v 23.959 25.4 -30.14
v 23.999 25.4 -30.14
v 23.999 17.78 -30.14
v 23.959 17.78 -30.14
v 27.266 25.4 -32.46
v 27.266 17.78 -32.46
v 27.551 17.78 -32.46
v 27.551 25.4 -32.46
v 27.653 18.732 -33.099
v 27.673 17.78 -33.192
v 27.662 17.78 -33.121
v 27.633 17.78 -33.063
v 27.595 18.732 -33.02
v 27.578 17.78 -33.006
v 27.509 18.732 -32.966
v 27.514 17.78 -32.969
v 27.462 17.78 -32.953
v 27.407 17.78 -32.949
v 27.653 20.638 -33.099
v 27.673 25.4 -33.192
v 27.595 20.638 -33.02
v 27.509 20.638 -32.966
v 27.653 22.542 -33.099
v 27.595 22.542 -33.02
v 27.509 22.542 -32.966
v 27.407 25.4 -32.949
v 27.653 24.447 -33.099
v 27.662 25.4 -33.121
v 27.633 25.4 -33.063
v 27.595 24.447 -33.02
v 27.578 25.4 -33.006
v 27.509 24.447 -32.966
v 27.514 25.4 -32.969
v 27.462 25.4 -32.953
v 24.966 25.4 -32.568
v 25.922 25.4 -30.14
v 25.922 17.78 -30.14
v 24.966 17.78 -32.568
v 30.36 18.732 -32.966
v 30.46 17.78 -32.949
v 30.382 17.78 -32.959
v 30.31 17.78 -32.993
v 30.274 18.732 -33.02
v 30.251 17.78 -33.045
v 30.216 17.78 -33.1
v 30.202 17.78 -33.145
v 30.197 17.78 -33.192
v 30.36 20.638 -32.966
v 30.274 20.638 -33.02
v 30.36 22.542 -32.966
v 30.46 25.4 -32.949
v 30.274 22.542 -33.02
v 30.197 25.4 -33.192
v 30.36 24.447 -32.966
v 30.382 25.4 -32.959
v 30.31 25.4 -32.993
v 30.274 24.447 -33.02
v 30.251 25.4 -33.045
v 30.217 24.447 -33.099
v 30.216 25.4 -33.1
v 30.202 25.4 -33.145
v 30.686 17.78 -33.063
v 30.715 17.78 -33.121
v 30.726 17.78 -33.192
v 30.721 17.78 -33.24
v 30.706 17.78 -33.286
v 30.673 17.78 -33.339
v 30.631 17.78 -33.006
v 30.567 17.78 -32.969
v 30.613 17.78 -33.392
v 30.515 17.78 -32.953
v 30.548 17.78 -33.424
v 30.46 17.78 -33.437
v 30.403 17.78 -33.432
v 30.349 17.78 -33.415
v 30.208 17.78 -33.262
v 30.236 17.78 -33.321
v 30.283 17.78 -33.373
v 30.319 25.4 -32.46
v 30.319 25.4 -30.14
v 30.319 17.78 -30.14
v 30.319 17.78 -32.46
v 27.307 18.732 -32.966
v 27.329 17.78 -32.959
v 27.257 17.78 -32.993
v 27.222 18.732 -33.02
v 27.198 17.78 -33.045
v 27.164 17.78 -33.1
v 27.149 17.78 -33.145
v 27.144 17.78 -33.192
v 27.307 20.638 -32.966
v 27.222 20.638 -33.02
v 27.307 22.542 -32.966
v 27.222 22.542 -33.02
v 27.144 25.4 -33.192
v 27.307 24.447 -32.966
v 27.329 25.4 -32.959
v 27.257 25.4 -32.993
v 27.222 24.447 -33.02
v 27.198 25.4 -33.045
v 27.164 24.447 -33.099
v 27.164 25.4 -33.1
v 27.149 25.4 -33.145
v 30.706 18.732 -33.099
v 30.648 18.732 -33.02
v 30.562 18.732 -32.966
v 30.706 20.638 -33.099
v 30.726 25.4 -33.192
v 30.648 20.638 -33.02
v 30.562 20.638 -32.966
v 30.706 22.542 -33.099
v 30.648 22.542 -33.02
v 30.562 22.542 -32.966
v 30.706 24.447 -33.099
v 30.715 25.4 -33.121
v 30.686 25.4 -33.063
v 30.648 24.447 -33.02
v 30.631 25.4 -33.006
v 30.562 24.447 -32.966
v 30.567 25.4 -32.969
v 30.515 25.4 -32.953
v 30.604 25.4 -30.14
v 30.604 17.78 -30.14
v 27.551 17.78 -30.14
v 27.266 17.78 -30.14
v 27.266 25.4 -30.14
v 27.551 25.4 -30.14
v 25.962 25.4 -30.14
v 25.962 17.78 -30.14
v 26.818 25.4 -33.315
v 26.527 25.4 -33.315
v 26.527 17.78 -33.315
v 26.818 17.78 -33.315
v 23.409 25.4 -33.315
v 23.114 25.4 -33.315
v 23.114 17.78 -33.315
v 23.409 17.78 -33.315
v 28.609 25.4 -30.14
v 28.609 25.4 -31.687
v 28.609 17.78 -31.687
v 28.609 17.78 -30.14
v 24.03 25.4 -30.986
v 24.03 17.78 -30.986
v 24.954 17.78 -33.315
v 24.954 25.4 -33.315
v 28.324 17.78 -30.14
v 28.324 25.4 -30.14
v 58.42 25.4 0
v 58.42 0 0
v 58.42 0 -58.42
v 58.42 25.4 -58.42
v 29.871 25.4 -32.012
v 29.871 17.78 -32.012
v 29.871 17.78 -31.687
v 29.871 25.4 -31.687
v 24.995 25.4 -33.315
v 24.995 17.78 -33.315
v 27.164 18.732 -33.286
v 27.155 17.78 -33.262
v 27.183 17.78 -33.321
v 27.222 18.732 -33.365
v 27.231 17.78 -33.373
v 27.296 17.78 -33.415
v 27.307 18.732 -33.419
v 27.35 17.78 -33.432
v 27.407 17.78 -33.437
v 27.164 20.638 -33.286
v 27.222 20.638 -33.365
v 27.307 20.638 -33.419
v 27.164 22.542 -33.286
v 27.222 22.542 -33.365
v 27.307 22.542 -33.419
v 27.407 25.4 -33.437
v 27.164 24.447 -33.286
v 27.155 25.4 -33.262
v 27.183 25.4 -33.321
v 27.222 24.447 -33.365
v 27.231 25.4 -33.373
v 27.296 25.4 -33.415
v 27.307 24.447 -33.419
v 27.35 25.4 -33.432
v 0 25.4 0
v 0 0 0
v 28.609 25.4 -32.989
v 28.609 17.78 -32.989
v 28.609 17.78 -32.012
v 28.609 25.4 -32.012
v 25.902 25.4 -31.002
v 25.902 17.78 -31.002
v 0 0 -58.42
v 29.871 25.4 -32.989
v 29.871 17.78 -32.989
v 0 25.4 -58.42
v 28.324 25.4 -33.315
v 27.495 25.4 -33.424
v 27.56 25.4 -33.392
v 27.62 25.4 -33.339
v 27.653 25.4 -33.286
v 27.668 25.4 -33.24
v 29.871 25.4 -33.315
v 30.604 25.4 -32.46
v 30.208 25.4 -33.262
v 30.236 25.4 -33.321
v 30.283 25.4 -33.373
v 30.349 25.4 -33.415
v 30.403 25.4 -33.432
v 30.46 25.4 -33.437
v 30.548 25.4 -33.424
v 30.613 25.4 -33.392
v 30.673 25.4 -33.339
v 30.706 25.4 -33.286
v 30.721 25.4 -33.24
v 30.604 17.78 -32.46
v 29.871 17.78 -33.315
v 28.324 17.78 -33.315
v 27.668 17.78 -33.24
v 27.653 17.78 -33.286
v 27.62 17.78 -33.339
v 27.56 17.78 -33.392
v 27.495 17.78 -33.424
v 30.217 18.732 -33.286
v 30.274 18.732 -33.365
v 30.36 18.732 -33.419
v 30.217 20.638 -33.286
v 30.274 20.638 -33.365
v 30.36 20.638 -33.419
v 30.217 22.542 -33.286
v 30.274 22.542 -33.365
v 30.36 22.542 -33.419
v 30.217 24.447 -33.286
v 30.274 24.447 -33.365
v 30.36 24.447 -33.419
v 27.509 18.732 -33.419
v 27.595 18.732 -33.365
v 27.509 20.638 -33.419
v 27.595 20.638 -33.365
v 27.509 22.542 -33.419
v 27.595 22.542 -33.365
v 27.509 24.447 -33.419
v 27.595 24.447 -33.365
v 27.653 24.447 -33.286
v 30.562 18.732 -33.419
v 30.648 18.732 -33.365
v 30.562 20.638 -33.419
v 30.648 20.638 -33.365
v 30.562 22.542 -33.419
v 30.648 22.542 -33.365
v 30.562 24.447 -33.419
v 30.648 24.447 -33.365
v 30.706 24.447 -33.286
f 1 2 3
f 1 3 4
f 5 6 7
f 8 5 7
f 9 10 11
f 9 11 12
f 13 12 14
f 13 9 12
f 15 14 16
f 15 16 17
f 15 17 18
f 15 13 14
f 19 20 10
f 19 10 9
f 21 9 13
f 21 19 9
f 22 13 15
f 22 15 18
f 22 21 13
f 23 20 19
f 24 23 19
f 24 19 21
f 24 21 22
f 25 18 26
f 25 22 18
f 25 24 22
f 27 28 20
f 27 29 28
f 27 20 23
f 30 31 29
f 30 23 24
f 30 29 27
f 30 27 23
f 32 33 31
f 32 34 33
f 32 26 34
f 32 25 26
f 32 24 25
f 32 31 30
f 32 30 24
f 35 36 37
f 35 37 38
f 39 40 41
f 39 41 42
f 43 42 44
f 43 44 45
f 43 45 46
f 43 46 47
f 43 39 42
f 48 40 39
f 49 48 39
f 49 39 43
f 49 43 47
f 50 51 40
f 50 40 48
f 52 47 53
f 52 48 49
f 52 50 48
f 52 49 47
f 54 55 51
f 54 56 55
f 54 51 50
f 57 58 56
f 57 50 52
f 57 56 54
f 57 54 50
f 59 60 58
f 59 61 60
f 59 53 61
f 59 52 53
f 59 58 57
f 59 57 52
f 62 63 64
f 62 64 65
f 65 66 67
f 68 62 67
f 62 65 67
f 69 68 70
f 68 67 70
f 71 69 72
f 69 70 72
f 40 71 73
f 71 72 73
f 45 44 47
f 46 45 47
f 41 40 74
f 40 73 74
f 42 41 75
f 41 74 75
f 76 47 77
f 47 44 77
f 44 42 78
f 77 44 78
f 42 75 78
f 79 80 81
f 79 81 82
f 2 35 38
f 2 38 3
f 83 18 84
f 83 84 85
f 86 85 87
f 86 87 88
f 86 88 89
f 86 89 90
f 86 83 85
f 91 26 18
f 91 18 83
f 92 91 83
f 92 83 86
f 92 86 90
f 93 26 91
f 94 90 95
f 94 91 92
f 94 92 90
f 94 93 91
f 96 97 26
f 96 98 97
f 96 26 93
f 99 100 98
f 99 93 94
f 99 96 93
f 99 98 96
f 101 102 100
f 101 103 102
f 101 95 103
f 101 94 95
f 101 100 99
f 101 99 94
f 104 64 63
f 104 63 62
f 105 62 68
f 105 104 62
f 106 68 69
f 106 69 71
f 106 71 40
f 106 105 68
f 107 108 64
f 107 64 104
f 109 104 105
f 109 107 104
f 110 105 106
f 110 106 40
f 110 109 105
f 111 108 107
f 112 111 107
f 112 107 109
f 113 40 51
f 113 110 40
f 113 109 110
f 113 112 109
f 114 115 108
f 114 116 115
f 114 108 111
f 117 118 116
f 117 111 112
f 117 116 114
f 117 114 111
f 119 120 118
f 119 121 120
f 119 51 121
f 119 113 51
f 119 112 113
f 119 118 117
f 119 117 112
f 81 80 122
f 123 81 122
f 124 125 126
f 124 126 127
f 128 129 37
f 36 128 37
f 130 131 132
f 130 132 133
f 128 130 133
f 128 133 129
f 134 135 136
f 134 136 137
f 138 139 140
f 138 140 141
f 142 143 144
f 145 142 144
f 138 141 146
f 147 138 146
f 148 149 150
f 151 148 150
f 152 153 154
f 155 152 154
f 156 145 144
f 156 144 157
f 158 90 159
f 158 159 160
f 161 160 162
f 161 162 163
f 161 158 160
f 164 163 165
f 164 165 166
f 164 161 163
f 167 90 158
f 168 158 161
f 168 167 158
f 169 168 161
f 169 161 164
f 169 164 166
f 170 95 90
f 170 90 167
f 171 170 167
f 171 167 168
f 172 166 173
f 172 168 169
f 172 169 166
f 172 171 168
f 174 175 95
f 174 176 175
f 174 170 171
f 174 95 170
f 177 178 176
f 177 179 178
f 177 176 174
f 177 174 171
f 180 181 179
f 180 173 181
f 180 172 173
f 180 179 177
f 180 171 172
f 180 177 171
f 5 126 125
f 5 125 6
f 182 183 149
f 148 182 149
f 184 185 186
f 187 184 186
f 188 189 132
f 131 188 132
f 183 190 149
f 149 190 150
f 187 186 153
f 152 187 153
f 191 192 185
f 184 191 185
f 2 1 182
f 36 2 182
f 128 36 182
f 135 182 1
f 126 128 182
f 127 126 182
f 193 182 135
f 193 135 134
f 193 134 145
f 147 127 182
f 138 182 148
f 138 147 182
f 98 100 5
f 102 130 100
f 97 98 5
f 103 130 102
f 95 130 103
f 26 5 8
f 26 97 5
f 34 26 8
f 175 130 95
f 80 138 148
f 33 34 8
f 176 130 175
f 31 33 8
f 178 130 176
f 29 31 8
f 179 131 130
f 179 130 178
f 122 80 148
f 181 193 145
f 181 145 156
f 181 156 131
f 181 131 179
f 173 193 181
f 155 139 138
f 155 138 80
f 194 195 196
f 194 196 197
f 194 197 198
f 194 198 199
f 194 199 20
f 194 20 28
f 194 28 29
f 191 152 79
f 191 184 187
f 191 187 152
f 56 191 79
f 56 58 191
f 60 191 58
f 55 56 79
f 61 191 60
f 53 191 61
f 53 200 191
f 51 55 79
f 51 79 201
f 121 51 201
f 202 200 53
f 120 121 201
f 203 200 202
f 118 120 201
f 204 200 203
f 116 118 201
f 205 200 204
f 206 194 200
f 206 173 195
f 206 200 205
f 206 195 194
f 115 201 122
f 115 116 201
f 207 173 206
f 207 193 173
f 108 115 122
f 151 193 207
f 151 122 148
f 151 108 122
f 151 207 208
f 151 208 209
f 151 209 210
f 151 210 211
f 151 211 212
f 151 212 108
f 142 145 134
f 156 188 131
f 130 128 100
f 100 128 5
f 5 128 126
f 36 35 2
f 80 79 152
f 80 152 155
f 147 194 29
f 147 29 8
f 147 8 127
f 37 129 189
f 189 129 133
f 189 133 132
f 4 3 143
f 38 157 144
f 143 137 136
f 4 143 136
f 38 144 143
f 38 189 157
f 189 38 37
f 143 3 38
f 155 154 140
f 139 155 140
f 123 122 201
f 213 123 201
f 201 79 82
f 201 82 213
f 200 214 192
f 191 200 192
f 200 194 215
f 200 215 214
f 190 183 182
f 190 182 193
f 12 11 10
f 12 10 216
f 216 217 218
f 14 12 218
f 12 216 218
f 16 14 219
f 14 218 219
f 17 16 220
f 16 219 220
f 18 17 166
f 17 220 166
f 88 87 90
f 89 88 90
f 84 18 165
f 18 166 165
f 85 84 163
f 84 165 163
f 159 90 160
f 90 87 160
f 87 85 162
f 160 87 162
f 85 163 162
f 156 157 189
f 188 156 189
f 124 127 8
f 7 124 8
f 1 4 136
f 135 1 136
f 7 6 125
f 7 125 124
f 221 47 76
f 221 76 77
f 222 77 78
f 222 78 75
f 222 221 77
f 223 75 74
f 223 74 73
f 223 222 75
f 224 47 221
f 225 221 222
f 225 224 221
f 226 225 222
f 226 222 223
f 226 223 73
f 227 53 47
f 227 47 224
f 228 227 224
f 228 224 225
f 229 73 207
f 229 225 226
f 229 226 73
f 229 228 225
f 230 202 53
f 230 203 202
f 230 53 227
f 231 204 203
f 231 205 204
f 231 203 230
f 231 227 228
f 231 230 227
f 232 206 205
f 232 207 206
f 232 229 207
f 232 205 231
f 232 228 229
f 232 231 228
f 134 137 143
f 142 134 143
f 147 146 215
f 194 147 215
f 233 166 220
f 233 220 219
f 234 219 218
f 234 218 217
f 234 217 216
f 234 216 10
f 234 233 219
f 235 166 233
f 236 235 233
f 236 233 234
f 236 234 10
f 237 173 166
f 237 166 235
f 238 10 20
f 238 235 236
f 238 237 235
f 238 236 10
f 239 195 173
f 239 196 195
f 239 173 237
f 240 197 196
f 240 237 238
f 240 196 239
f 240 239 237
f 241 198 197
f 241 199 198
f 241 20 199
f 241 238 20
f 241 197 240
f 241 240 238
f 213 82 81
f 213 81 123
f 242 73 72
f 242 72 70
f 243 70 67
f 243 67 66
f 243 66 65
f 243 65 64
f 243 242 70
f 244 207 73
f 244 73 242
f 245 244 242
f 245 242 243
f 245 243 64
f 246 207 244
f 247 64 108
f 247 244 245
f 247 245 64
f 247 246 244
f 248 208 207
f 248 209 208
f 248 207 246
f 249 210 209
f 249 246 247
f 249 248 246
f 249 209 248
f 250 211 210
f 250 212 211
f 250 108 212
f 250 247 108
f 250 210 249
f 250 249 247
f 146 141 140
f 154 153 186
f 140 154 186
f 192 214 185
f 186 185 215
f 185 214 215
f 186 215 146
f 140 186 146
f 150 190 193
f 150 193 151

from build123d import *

# Parameters (mm, degrees)
SKETCH1_W           = 58.42
SKETCH1_H           = 58.42
BOSS_EXTRUDE1_DEPTH = 25.4
SKETCH2_W           = 0.284935898
SKETCH2_H           = 2.320192308
SKETCH2_W_2         = 0.284935897
CUT_EXTRUDE1_DEPTH  = 7.62


with BuildPart() as part:
    # Sketch1 → Boss-Extrude1 (new body)
    with BuildSketch(Plane(origin=(0, 0, 0), x_dir=(1, 0, 0), z_dir=(0, 1, 0))):
        with Locations((29.21, 29.21)):
            Rectangle(SKETCH1_W, SKETCH1_H)
    extrude(amount=BOSS_EXTRUDE1_DEPTH)

    # Sketch2 → Cut-Extrude1 (cut)
    with BuildSketch(Plane(origin=(0, 25.4, 0), x_dir=(1, 0, 0), z_dir=(0, 1, 0))):
        Polygon((23.114155591, 33.314953012), (23.408631753, 33.314953012), (24.030020976, 30.986492475), (24.95415459, 33.314953012), (24.995495735, 33.314953012), (25.902456873, 31.002392916), (26.527026184, 33.314953012), (26.818322258, 33.314953012), (25.96224253, 30.139953012), (25.921537402, 30.139953012), (24.966238925, 32.568268317), (23.99949213, 30.139953012), (23.958787001, 30.139953012), align=None)
        with BuildLine():
            add(Edge.make_bspline(
                [(27.407274582, 33.437068397), (27.42495599, 33.436248201), (27.459579582, 33.434642101), (27.509647761, 33.420888476), (27.55523805, 33.39757519), (27.595676422, 33.366297193), (27.630376348, 33.329513055), (27.654670278, 33.286640605), (27.67028438, 33.240323126), (27.672169927, 33.208015152), (27.67312995, 33.191565592)],
                knots=[0, 0, 0, 0, 1.055194115, 2.066272739, 3.074728998, 4.095836921, 5.109056067, 6.073838105, 7.019297344, 8, 8, 8, 8], degree=3))
            add(Edge.make_bspline(
                [(27.67312995, 33.191565592), (27.672148277, 33.175543043), (27.670207624, 33.143868358), (27.654682338, 33.098353851), (27.630169308, 33.056077108), (27.595698673, 33.019364393), (27.555232154, 32.988103687), (27.509649327, 32.964785817), (27.45957917, 32.951033407), (27.42495585, 32.949427139), (27.407274582, 32.948606858)],
                knots=[0, 0, 0, 0, 0.96129708, 1.900370562, 2.859976407, 3.87933698, 4.906634145, 5.921202961, 6.938410037, 8, 8, 8, 8], degree=3))
            add(Edge.make_bspline(
                [(27.407274582, 32.948606858), (27.389795503, 32.949395819), (27.355774761, 32.950931427), (27.306456269, 32.965055658), (27.26125471, 32.988111667), (27.220737472, 33.019159706), (27.186964368, 33.056302577), (27.162382316, 33.098328051), (27.146892886, 33.143874927), (27.144947401, 33.175545249), (27.143963284, 33.191565592)],
                knots=[0, 0, 0, 0, 1.054934014, 2.053291228, 3.073705704, 4.106921865, 5.123545215, 6.088680038, 7.033164197, 8, 8, 8, 8], degree=3))
            add(Edge.make_bspline(
                [(27.143963284, 33.191565592), (27.144925841, 33.208012863), (27.146816364, 33.24031634), (27.162393926, 33.286666835), (27.186759609, 33.329285768), (27.220759834, 33.366501757), (27.261248759, 33.397567259), (27.306457806, 33.420618649), (27.355774355, 33.434744078), (27.389795366, 33.436279521), (27.407274582, 33.437068397)],
                knots=[0, 0, 0, 0, 0.98631895, 1.937192651, 2.907499808, 3.917963147, 4.944918757, 5.95915025, 6.951458133, 8, 8, 8, 8], degree=3))
        make_face()
        with Locations((27.408546617, 31.300049166)):
            Rectangle(SKETCH2_W, SKETCH2_H)
        Polygon((28.324412001, 33.314953012), (29.871206873, 33.314953012), (29.871206873, 32.989311986), (28.609347899, 32.989311986), (28.609347899, 32.01238891), (29.871206873, 32.01238891), (29.871206873, 31.686747884), (28.609347899, 31.686747884), (28.609347899, 30.139953012), (28.324412001, 30.139953012), align=None)
        with BuildLine():
            add(Edge.make_bspline(
                [(30.460159197, 33.437068397), (30.477840605, 33.436248201), (30.512464197, 33.434642101), (30.562532376, 33.420888476), (30.608122666, 33.39757519), (30.648561038, 33.366297193), (30.683260963, 33.329513055), (30.707554893, 33.286640605), (30.723168996, 33.240323126), (30.725054542, 33.208015152), (30.726014566, 33.191565592)],
                knots=[0, 0, 0, 0, 1.055194115, 2.066272739, 3.074728998, 4.095836921, 5.109056067, 6.073838105, 7.019297344, 8, 8, 8, 8], degree=3))
            add(Edge.make_bspline(
                [(30.726014566, 33.191565592), (30.725032892, 33.175543043), (30.72309224, 33.143868358), (30.707566954, 33.098353851), (30.683053924, 33.056077108), (30.648583288, 33.019364393), (30.608116769, 32.988103687), (30.562533942, 32.964785817), (30.512463785, 32.951033407), (30.477840466, 32.949427139), (30.460159197, 32.948606858)],
                knots=[0, 0, 0, 0, 0.96129708, 1.900370562, 2.859976407, 3.87933698, 4.906634145, 5.921202961, 6.938410037, 8, 8, 8, 8], degree=3))
            add(Edge.make_bspline(
                [(30.460159197, 32.948606858), (30.442680119, 32.949395819), (30.408659377, 32.950931427), (30.359340884, 32.965055658), (30.314139326, 32.988111667), (30.273622087, 33.019159706), (30.239848983, 33.056302577), (30.215266931, 33.098328051), (30.199777501, 33.143874927), (30.197832017, 33.175545249), (30.196847899, 33.191565592)],
                knots=[0, 0, 0, 0, 1.054934014, 2.053291228, 3.073705704, 4.106921865, 5.123545215, 6.088680038, 7.033164197, 8, 8, 8, 8], degree=3))
            add(Edge.make_bspline(
                [(30.196847899, 33.191565592), (30.197810456, 33.208012863), (30.199700979, 33.24031634), (30.215278542, 33.286666835), (30.239644224, 33.329285768), (30.27364445, 33.366501757), (30.314133374, 33.397567259), (30.359342422, 33.420618649), (30.408658971, 33.434744078), (30.442679981, 33.436279521), (30.460159197, 33.437068397)],
                knots=[0, 0, 0, 0, 0.98631895, 1.937192651, 2.907499808, 3.917963147, 4.944918757, 5.95915025, 6.951458133, 8, 8, 8, 8], degree=3))
        make_face()
        with Locations((30.461431233, 31.300049166)):
            Rectangle(SKETCH2_W_2, SKETCH2_H)
    extrude(amount=-CUT_EXTRUDE1_DEPTH, mode=Mode.SUBTRACT)


solid = part.part
